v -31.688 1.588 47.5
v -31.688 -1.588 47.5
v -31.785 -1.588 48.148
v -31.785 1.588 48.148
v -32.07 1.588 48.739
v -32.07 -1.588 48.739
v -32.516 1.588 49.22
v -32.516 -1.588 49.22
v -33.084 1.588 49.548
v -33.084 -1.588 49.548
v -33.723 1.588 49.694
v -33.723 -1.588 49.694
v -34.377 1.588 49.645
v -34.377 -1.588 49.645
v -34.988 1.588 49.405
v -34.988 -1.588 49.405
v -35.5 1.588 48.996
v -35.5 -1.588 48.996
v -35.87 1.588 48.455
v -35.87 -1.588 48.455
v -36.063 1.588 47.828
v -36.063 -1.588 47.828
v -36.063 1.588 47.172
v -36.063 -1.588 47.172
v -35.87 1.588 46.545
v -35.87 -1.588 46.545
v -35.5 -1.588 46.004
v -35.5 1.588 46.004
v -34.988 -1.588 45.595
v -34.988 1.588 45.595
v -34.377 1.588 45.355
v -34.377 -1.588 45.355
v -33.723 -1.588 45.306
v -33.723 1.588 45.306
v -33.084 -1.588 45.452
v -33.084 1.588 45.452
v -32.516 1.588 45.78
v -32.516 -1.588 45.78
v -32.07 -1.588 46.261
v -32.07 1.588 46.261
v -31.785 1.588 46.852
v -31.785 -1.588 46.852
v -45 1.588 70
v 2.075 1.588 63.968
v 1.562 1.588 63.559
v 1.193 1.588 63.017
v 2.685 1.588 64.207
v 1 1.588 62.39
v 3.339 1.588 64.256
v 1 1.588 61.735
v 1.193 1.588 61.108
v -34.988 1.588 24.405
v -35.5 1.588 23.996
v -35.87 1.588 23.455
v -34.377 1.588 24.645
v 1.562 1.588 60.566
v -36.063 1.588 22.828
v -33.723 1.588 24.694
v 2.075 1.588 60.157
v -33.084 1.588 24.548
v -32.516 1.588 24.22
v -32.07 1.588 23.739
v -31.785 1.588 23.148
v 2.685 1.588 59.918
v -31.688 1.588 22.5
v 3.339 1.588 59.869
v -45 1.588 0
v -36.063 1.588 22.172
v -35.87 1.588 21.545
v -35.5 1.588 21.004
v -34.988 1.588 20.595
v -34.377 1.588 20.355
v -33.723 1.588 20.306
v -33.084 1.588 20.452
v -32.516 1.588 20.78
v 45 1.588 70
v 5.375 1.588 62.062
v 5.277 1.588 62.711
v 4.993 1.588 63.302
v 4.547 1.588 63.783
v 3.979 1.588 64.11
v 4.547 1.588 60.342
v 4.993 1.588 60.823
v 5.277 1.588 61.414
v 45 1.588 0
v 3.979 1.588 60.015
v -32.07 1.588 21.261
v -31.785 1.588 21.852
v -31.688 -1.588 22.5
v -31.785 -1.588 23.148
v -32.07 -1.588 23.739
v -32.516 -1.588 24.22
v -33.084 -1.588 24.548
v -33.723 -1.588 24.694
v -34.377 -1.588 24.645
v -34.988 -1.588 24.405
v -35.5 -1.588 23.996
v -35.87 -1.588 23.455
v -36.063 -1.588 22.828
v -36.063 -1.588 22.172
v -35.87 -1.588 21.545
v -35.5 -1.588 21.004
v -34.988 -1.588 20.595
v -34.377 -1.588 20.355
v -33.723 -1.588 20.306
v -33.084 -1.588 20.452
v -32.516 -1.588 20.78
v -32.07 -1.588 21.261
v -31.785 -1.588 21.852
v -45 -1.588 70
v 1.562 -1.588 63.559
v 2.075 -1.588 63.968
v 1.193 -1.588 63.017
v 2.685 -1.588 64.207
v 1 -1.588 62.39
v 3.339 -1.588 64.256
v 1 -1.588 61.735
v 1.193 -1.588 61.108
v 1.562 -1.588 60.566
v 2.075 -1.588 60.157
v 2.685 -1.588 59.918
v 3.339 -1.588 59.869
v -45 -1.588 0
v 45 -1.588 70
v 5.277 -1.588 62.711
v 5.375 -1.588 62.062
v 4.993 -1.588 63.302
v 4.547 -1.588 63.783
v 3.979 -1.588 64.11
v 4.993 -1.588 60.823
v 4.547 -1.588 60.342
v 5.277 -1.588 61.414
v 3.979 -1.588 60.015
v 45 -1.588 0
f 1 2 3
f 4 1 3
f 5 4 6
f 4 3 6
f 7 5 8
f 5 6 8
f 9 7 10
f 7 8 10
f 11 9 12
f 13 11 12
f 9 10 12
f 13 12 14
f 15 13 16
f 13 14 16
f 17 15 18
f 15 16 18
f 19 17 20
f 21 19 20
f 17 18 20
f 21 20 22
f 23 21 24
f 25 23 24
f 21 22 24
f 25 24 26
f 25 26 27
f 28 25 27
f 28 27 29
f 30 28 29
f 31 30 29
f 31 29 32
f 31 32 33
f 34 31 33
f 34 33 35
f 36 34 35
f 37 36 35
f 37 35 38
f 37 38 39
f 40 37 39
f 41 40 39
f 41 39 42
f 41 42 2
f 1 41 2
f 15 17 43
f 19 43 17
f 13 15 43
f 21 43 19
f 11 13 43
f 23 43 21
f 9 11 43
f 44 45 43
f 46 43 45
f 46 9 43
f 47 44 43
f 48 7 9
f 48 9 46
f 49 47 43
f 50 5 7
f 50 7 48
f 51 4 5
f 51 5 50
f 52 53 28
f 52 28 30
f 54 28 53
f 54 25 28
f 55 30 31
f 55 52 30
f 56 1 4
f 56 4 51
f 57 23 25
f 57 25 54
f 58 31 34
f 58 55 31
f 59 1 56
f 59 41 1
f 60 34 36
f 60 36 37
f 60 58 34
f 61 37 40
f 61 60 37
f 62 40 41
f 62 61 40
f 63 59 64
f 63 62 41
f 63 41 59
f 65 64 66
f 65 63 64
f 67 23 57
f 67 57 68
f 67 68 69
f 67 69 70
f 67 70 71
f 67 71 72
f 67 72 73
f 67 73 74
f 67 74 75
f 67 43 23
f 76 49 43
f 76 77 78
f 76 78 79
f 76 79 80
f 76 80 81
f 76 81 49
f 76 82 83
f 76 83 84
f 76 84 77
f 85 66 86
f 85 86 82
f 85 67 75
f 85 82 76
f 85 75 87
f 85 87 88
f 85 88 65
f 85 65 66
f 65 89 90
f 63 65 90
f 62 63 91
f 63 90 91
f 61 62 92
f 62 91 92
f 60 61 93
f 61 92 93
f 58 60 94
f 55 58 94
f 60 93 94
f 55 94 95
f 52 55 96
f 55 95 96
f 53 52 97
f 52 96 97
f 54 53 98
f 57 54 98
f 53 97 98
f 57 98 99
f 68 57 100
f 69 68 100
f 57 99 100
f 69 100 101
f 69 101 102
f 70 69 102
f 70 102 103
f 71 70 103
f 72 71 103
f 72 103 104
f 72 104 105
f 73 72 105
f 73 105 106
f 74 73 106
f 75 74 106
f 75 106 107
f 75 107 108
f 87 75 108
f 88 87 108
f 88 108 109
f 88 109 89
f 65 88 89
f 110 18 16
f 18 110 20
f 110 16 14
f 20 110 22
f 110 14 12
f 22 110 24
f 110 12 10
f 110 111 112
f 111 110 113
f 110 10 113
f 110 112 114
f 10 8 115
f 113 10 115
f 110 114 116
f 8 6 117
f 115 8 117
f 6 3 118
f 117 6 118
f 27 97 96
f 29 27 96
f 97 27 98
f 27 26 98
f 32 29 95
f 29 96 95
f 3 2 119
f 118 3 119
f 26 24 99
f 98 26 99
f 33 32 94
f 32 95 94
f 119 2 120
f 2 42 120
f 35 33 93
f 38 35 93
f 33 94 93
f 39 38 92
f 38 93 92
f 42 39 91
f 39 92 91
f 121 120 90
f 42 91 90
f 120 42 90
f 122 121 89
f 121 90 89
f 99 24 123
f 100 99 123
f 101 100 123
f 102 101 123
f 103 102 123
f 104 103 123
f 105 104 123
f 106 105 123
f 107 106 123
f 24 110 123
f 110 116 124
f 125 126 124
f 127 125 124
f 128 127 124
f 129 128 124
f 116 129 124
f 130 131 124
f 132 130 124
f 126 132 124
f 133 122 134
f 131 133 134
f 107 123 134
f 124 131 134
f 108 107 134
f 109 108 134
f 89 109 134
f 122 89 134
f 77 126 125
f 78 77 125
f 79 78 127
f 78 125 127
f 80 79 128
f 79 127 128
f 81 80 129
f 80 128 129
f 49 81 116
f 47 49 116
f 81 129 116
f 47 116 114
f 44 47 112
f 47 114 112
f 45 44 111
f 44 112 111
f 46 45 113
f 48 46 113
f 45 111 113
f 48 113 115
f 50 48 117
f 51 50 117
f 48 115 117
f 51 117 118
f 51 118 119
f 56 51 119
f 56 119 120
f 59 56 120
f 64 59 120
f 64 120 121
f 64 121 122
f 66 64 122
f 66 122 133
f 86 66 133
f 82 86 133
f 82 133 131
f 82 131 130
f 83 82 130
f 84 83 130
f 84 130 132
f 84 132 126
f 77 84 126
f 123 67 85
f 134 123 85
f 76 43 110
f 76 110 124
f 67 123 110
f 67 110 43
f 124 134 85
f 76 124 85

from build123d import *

# Parameters (mm, degrees)
F0_W     = 90
F0_H     = 3.175
F1_DEPTH = 70
F3_D     = 4.4


with BuildPart() as f1:
    # F0 (on Top) → F1 (new body)
    with BuildSketch(Plane.XY):
        Rectangle(F0_W, F0_H)
    extrude(amount=F1_DEPTH)

    # F3 (through all)
    with Locations(Plane(origin=(0, 1.5875, 0), x_dir=(-1, 0, 0), z_dir=(0, 1, 0))):
        with Locations((33.8875, 22.5), (33.8875, 47.5), (-3.175, 62.0625)):
            Hole(F3_D / 2)


solid = f1.part
